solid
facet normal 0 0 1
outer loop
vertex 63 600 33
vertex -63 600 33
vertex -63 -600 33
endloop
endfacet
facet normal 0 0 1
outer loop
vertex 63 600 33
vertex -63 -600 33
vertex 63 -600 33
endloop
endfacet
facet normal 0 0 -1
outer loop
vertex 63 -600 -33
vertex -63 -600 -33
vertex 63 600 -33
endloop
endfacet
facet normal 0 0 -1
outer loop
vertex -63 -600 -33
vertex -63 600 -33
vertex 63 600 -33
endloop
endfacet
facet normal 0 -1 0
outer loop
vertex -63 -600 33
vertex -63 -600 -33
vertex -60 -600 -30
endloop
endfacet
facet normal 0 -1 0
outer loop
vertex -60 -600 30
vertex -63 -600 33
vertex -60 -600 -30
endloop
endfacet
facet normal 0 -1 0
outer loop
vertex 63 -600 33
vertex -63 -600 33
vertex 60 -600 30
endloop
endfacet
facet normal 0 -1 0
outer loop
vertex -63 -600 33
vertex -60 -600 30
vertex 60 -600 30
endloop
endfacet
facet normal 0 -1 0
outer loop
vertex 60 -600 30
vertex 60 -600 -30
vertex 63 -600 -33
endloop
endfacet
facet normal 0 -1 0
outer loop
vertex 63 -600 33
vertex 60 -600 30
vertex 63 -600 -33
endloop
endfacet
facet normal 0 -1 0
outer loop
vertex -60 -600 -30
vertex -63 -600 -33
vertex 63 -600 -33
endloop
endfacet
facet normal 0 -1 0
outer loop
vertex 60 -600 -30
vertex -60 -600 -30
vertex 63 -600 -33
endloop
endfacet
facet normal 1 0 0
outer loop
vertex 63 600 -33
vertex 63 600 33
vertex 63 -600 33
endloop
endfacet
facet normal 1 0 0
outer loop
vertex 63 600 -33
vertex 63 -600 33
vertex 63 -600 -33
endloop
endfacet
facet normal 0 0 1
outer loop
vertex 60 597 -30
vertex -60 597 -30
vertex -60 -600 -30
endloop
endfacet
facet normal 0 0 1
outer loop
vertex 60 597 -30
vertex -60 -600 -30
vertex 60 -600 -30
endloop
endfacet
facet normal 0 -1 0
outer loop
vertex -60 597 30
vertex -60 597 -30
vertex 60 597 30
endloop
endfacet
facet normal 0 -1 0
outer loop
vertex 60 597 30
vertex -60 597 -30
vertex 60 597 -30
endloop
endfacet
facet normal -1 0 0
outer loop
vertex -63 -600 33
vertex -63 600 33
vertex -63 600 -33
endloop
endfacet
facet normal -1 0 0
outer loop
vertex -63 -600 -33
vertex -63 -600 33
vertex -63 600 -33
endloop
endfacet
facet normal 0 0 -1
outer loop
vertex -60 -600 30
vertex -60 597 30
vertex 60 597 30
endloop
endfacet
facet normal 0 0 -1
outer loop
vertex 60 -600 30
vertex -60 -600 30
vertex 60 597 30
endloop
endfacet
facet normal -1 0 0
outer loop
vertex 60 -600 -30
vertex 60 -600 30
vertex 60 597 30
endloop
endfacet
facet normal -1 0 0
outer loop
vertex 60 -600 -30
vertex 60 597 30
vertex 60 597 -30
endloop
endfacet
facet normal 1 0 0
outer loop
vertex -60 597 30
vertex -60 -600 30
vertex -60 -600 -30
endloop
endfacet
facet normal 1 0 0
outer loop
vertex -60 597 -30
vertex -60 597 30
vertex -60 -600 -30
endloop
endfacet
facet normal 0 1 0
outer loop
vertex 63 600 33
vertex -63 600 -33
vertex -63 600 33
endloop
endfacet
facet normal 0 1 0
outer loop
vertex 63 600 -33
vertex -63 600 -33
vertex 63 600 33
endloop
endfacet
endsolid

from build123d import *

# Parameters (mm, degrees)
SKETCH1_W           = 126
SKETCH1_H           = 66
SKETCH1_W_2         = 120
SKETCH1_H_2         = 60
EXTRUDE_THIN1_DEPTH = 600
SKETCH2_W           = 120
SKETCH2_H           = 60
BOSS_EXTRUDE1_DEPTH = 3


with BuildPart() as part:
    # Sketch1 → Extrude-Thin1 (new, symmetric)
    with BuildSketch(Plane(origin=(0, 0, 0), x_dir=(1, 0, 0), z_dir=(0, 1, 0))):
        Rectangle(SKETCH1_W, SKETCH1_H)
        Rectangle(SKETCH1_W_2, SKETCH1_H_2, mode=Mode.SUBTRACT)
    extrude(amount=EXTRUDE_THIN1_DEPTH, both=True)

    # Sketch2 → Boss-Extrude1 (add)
    with BuildSketch(Plane(origin=(0, 600, 0), x_dir=(1, 0, 0), z_dir=(0, 1, 0))):
        Rectangle(SKETCH2_W, SKETCH2_H)
    extrude(amount=-BOSS_EXTRUDE1_DEPTH)


solid = part.part
